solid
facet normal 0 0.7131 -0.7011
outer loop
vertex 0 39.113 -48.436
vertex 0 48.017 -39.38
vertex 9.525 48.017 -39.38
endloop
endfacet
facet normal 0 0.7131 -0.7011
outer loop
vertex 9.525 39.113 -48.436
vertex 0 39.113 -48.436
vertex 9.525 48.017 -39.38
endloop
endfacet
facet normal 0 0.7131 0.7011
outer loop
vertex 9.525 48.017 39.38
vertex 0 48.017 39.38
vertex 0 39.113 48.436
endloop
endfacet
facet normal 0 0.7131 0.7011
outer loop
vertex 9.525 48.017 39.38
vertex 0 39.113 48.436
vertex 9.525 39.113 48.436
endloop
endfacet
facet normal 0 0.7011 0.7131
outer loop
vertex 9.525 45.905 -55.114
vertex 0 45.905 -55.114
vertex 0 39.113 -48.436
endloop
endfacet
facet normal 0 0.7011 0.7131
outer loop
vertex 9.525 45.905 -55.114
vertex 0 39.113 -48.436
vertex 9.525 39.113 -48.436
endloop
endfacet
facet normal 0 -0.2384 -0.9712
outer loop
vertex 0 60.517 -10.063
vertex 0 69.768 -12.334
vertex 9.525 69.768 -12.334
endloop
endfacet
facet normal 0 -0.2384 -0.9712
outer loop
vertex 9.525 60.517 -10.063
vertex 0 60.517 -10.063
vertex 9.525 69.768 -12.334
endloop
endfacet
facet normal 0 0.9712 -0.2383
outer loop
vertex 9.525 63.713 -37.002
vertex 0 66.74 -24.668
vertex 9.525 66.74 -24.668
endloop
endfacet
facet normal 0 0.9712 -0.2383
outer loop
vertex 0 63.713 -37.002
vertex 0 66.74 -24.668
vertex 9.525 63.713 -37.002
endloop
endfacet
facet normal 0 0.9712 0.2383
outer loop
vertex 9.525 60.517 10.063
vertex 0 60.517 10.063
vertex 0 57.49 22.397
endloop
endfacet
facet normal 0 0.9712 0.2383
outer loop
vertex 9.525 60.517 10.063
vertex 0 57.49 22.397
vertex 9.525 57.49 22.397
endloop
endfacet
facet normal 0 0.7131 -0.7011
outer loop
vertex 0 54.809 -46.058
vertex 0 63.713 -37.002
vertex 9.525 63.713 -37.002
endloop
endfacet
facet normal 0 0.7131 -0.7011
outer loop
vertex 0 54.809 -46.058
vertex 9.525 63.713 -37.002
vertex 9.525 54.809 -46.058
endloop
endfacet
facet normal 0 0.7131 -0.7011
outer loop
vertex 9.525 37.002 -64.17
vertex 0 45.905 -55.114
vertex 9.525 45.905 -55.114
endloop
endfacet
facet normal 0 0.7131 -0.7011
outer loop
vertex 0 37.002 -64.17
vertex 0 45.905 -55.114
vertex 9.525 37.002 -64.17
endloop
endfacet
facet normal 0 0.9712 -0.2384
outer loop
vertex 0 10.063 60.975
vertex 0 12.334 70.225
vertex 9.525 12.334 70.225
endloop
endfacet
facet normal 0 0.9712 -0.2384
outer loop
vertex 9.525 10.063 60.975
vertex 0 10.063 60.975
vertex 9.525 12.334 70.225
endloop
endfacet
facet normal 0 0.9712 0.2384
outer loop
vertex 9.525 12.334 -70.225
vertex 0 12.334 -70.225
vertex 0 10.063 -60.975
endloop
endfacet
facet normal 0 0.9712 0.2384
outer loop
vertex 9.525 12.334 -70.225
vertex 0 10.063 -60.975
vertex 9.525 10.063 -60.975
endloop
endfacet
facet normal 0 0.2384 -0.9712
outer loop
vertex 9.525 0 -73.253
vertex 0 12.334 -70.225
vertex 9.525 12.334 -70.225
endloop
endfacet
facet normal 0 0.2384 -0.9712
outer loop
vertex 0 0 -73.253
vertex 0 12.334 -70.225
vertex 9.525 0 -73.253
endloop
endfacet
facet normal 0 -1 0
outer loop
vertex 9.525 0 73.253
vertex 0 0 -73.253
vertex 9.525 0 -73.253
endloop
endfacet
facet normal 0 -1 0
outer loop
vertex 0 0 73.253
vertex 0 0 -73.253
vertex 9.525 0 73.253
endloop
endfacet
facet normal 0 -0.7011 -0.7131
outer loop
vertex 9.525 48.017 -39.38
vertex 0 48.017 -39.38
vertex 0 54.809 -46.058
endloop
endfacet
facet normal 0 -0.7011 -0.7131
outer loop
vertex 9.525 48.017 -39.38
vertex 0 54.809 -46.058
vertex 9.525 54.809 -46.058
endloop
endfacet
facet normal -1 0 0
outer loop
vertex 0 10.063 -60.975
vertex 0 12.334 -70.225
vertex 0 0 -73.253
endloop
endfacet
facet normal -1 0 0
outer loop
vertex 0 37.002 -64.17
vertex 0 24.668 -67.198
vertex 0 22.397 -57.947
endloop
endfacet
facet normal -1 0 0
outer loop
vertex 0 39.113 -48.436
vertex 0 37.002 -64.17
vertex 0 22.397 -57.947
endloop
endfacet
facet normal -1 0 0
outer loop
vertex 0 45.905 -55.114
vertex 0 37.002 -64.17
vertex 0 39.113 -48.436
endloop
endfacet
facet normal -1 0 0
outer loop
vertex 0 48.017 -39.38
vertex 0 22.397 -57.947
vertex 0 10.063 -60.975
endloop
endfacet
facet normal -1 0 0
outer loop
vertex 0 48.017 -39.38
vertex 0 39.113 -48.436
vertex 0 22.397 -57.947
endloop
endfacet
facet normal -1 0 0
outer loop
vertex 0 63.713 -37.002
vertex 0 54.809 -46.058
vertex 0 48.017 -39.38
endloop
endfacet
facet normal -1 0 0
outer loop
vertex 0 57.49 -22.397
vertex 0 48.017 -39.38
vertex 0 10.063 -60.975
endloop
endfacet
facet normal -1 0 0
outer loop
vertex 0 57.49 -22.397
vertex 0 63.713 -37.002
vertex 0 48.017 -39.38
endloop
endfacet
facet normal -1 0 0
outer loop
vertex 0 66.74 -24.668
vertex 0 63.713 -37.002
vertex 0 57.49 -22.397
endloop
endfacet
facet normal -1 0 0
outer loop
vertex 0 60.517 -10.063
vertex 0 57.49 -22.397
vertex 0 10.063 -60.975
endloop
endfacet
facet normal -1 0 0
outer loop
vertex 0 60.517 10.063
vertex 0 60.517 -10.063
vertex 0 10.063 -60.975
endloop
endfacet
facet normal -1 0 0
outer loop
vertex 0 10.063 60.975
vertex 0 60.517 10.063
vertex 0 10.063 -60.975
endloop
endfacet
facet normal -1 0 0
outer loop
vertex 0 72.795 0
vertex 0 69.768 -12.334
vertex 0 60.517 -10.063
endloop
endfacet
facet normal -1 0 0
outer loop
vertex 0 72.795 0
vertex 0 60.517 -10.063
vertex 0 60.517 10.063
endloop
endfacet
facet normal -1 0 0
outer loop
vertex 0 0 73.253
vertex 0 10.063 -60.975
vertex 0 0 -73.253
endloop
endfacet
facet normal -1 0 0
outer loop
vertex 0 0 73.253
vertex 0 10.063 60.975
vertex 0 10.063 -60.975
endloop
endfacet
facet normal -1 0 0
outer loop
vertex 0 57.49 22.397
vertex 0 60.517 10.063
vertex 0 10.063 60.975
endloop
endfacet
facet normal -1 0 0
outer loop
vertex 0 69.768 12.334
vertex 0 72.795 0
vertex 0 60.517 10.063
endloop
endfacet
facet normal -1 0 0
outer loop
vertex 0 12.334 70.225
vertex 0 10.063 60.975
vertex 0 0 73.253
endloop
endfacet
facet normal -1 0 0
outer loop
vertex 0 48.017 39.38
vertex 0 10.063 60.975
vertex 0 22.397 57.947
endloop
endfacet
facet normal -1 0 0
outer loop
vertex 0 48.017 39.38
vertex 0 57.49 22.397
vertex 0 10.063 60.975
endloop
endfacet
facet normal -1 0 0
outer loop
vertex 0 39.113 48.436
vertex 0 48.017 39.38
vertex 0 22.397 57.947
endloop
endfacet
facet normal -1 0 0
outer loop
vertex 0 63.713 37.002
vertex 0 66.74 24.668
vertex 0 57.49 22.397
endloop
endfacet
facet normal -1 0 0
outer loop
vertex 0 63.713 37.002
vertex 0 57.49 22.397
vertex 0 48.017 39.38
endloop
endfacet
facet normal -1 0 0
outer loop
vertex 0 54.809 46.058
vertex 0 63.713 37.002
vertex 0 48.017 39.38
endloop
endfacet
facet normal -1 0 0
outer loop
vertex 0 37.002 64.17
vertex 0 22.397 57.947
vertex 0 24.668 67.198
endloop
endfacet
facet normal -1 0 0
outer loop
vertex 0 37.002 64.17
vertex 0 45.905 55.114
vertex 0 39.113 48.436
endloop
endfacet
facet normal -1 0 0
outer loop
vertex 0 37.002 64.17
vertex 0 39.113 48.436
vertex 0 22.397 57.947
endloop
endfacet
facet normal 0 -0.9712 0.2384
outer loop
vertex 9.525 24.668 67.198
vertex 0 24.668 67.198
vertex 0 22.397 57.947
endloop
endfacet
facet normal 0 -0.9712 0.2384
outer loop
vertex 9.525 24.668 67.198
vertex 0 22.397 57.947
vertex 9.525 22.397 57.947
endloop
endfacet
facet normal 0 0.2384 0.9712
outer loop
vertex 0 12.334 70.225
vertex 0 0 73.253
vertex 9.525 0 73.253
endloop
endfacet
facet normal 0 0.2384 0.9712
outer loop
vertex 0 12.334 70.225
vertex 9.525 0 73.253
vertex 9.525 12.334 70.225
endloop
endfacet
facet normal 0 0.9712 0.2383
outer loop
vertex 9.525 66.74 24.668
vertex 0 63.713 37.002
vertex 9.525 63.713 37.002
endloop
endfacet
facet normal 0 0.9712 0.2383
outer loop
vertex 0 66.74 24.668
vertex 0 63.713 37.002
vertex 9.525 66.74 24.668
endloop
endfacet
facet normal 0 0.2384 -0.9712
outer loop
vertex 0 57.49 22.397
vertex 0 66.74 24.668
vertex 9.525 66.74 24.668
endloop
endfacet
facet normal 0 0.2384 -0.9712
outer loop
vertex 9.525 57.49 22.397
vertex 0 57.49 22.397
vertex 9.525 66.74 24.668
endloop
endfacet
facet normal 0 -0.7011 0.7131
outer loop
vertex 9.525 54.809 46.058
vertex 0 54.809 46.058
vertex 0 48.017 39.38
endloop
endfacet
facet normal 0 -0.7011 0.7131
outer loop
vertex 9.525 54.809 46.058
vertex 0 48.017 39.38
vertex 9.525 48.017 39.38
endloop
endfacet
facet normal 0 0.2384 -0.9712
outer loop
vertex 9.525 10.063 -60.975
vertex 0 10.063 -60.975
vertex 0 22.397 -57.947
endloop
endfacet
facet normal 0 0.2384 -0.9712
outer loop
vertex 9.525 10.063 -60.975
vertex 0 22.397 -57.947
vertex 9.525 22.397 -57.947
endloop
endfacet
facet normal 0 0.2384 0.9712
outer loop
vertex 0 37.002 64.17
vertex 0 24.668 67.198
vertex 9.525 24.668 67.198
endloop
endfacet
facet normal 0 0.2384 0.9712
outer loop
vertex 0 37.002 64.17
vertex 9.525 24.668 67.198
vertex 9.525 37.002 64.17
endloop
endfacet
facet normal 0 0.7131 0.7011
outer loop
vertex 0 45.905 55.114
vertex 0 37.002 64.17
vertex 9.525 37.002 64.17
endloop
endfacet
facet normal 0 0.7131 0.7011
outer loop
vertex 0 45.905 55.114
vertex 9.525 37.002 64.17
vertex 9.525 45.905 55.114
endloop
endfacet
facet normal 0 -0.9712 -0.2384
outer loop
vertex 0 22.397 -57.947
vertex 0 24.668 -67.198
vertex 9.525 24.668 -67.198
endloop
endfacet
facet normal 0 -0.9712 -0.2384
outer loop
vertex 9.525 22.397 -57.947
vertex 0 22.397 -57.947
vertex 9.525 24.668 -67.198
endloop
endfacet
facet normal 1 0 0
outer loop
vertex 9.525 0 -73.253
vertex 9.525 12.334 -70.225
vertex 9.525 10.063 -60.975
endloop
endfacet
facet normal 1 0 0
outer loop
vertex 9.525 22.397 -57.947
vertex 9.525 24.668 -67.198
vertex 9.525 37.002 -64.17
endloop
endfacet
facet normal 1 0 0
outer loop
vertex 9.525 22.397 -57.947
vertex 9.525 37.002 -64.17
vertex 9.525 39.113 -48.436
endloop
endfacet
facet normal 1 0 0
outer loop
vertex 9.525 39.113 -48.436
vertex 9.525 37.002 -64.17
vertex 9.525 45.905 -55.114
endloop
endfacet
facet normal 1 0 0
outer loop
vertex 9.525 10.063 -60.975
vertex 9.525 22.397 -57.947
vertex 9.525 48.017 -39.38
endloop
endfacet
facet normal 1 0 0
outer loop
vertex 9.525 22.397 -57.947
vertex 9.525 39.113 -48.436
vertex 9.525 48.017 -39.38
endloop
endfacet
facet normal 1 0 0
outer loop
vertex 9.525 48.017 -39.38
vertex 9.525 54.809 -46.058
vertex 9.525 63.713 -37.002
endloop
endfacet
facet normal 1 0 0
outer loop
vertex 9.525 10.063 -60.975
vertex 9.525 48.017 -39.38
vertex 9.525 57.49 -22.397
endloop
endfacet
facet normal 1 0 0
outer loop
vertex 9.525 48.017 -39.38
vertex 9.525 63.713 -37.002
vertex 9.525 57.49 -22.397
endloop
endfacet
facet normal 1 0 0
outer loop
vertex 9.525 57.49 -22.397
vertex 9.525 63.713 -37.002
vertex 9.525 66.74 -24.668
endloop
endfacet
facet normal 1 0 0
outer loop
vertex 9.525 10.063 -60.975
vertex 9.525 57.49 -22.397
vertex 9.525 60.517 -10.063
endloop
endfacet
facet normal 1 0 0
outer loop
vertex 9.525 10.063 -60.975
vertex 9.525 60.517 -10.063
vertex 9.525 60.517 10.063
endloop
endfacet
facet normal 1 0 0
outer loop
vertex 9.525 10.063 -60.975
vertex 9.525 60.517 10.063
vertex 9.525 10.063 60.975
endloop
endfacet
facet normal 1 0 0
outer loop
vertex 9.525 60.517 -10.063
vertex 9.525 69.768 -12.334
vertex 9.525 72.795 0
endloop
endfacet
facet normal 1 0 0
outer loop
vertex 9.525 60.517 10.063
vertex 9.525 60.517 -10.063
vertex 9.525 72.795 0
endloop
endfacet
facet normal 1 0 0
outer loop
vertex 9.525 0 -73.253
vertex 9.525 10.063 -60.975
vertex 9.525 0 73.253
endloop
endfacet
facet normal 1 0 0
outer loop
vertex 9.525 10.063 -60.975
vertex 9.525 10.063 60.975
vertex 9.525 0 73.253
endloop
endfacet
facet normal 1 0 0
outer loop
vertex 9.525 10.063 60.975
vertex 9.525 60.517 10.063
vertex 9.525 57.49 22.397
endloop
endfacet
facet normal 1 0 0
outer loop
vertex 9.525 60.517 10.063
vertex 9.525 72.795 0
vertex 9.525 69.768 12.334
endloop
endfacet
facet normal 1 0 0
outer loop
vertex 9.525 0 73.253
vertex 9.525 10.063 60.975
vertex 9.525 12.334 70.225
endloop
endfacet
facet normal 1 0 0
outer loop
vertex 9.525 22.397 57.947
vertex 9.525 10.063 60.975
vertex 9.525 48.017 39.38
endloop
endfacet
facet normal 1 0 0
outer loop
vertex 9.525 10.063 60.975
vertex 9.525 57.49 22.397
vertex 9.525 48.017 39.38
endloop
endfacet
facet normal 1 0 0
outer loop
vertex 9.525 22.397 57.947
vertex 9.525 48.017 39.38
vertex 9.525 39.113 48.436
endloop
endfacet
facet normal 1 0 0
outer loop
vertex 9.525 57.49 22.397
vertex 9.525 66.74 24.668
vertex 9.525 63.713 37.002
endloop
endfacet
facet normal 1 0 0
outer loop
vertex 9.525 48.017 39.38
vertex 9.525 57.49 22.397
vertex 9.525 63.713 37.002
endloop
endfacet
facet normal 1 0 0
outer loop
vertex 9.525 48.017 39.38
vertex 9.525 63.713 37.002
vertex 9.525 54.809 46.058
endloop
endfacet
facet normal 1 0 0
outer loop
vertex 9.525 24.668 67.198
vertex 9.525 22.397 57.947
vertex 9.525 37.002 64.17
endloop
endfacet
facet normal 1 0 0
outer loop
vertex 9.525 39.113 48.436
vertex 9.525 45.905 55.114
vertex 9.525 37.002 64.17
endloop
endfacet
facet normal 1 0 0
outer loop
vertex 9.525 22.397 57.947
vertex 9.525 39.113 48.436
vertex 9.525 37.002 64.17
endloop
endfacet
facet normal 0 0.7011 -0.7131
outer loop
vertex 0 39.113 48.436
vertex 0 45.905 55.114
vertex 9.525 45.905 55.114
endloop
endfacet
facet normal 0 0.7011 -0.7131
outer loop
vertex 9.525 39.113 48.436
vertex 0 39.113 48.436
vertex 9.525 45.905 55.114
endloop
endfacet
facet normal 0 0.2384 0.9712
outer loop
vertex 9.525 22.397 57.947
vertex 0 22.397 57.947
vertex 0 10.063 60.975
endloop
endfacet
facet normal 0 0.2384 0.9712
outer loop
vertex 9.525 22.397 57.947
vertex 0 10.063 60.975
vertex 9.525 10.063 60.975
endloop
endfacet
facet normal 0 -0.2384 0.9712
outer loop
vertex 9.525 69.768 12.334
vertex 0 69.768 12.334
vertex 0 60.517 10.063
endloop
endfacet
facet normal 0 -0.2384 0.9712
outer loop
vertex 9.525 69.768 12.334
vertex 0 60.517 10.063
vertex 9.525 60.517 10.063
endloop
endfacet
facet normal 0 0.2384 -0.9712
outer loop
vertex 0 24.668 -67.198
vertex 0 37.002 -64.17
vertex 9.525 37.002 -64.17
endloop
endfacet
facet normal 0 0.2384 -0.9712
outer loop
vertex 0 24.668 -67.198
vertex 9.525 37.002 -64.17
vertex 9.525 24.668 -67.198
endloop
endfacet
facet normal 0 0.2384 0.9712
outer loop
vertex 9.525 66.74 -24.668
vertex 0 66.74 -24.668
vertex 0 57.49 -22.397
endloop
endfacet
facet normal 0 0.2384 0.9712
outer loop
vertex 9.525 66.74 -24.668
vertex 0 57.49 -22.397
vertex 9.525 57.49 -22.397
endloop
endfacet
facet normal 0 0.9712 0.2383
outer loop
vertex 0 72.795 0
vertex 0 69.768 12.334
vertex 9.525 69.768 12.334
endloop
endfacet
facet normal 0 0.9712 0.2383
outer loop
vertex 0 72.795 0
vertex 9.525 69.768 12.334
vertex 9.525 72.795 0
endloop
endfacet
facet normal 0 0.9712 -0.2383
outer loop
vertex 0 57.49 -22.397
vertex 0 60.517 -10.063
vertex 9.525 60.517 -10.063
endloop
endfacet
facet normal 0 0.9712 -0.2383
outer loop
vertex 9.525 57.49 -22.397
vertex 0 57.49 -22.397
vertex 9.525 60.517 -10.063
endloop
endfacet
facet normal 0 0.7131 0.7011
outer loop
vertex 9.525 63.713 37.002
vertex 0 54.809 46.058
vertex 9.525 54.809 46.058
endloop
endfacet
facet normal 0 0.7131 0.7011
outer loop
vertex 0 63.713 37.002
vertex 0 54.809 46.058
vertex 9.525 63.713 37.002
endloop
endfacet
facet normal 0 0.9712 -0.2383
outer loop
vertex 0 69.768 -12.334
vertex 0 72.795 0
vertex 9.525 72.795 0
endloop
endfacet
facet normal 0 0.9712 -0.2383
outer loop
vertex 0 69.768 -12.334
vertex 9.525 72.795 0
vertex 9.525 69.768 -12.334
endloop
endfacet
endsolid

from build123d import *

# Parameters (mm, degrees)
BOSS_EXTRUDE1_DEPTH = 9.525
SKETCH3_W           = 9.525
SKETCH3_H           = 12.7
CUT_EXTRUDE1_DEPTH  = 9.525
SKETCH4_W           = 9.525
SKETCH4_H           = 12.7
CUT_EXTRUDE2_DEPTH  = 9.525
SKETCH5_W           = 9.525
SKETCH5_H           = 12.7
CUT_EXTRUDE3_DEPTH  = 9.525


with BuildPart() as part:
    # Sketch2 → Boss-Extrude1 (new body)
    with BuildSketch(Plane(origin=(0, 0, 0), x_dir=(0, 0, -1), z_dir=(1, 0, 0))):
        Polygon((-73.252839905, 0), (-64.170161704, 37.001553436), (-37.001553436, 63.712538532), (0, 72.795216732), (37.001553436, 63.712538532), (64.170161704, 37.001553436), (73.252839905, 0), align=None)
    extrude(amount=BOSS_EXTRUDE1_DEPTH)

    # Sketch3 → Cut-Extrude1 (cut)
    with BuildSketch(Plane(origin=(0, 16.959318632, 69.089878642), x_dir=(1, 0, 0), z_dir=(0, 0.238390504, 0.971169382))):
        with Locations((4.7625, 1.58721858)):
            Rectangle(SKETCH3_W, SKETCH3_H)
    cut_extrude1 = extrude(amount=-CUT_EXTRUDE1_DEPTH, mode=Mode.SUBTRACT)

    # Sketch4 → Cut-Extrude2 (cut)
    with BuildSketch(Plane(origin=(0, 50.895476621, 50.038202327), x_dir=(1, 0, 0), z_dir=(0, 0.713086831, 0.701075724))):
        with Locations((4.7625, -0.768006391)):
            Rectangle(SKETCH4_W, SKETCH4_H)
    cut_extrude2 = extrude(amount=-CUT_EXTRUDE2_DEPTH, mode=Mode.SUBTRACT)

    # Sketch5 → Cut-Extrude3 (cut)
    with BuildSketch(Plane(origin=(0, 68.658262209, 16.853370832), x_dir=(1, 0, 0), z_dir=(0, 0.971169382, 0.238390504))):
        with Locations((4.7625, -1.696311598)):
            Rectangle(SKETCH5_W, SKETCH5_H)
    cut_extrude3 = extrude(amount=-CUT_EXTRUDE3_DEPTH, mode=Mode.SUBTRACT)

    # Mirror1: Cut-Extrude1, Cut-Extrude2, Cut-Extrude3 across plane
    add(cut_extrude1.mirror(Plane.XY), mode=Mode.SUBTRACT)
    add(cut_extrude2.mirror(Plane.XY), mode=Mode.SUBTRACT)
    add(cut_extrude3.mirror(Plane.XY), mode=Mode.SUBTRACT)


solid = part.part
